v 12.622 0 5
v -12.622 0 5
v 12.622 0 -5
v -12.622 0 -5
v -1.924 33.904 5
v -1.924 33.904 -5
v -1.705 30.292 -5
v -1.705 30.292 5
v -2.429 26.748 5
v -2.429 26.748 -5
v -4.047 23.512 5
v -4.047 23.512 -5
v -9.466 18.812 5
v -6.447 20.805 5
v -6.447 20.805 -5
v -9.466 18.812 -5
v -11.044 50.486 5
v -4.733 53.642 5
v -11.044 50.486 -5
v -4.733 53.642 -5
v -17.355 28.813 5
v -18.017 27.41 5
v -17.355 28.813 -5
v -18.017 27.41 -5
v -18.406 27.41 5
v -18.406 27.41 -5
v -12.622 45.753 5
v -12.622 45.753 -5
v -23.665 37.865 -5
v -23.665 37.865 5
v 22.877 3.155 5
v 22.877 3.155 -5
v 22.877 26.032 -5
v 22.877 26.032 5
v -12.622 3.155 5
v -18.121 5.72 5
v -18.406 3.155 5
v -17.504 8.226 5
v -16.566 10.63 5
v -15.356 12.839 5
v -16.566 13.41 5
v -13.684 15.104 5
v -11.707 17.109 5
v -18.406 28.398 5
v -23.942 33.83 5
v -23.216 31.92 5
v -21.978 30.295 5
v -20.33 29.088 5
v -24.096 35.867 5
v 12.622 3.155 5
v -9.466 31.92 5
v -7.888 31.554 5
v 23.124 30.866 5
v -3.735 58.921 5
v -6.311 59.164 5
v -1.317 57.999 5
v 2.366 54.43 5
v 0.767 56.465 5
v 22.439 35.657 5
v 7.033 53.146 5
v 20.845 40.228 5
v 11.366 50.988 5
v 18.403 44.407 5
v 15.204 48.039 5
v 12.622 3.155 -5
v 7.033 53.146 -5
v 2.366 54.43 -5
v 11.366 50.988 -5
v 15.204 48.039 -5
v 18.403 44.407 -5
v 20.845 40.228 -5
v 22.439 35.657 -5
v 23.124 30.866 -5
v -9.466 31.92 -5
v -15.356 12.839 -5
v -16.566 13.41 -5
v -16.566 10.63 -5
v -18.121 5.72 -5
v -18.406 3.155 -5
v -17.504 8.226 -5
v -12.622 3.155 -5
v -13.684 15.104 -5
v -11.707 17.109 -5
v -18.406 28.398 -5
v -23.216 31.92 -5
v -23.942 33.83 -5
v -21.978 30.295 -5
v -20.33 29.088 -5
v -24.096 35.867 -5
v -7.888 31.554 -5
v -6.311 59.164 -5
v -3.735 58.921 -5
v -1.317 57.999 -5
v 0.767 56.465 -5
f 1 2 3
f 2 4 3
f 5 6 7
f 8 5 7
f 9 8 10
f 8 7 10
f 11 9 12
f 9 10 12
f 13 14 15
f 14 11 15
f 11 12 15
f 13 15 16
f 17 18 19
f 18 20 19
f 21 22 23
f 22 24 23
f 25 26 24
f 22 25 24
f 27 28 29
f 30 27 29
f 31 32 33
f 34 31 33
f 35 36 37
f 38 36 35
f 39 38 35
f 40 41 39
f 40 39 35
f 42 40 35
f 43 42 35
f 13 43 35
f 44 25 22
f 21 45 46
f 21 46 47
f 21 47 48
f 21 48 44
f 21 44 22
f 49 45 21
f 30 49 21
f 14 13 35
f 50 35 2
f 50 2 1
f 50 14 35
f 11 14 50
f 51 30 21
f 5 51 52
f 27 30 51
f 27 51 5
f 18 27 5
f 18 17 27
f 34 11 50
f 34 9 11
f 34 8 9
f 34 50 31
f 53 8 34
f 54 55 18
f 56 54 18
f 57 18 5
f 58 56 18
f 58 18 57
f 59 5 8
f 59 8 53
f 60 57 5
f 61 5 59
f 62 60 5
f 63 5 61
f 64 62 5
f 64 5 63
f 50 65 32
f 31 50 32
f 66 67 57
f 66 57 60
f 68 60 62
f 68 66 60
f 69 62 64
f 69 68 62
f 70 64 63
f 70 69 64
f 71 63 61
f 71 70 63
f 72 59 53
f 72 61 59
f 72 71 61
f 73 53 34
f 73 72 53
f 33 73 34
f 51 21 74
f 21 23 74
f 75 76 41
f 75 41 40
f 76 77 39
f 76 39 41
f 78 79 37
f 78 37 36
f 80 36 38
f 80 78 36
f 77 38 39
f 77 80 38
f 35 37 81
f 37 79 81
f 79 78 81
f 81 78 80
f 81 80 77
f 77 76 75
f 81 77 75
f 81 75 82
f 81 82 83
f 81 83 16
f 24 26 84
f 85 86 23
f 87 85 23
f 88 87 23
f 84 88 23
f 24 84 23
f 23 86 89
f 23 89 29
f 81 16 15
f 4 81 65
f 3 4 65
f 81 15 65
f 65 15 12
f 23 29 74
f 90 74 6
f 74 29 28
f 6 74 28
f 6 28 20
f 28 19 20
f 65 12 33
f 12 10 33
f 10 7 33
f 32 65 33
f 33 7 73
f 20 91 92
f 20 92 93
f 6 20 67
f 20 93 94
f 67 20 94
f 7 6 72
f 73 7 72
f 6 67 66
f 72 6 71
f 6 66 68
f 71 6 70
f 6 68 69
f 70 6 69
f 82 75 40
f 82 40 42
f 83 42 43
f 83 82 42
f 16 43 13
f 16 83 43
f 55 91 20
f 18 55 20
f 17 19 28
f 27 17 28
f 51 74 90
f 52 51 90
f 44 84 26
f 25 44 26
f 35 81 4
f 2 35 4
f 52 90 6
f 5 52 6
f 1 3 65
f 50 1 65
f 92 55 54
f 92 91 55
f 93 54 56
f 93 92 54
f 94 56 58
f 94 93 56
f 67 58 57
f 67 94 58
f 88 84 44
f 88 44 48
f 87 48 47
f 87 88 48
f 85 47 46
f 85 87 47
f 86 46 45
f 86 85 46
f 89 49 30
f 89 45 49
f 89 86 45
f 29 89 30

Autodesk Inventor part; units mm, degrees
ref_plane "YZ Plane" through (0, 0, 0) normal (1, 0, 0) x (0, 1, 0)
ref_plane "XZ Plane" through (0, 0, 0) normal (0, 1, 0) x (-1, 0, 0)
ref_plane "XY Plane" through (0, 0, 0) normal (0, 0, 1) x (1, 0, 0)
sketch "Boceto1" plane through (0, 0, 0) normal (0, 0, 1) x (1, 0, 0)
  line L0 (-55.5895, 69.239) -> (57.1029, 69.239) construction
  line L1 (57.1029, 69.239) -> (57.1029, -41.5752) construction
  line L2 (57.1029, -41.5752) -> (-55.5895, -41.5752) construction
  line L3 (-55.5895, -41.5752) -> (-55.5895, 69.239) construction
  line L4 (-12.6216, 0) -> (12.6216, 0)
  line L5 (12.6216, 0) -> (12.6216, 3.1554)
  line L6 (12.6216, 3.1554) -> (22.8766, 3.1554)
  line L7 (22.8766, 3.1554) -> (22.8766, 26.032)
  arc A0 (22.8766, 26.032) -> (2.3665, 54.4304) centre (-1.924, 29.7261) ccw
  arc A1 (2.3665, 54.4304) -> (-6.3108, 59.1635) centre (-5.9164, 49.5659) ccw
  line L8 (-6.3108, 59.1635) -> (-4.7331, 53.6416)
  line L9 (-4.7331, 53.6416) -> (-11.0439, 50.4862)
  line L10 (-11.0439, 50.4862) -> (-12.6216, 45.7531)
  line L11 (-12.6216, 45.7531) -> (-23.6654, 37.8647)
  arc A2 (-23.6654, 37.8647) -> (-18.4064, 28.3985) centre (-16.9879, 35.3805) ccw
  line L12 (-18.4064, 28.3985) -> (-9.4662, 31.9205)
  line L13 (-9.4662, 31.9205) -> (-7.8885, 31.5539)
  line L14 (-7.8885, 31.5539) -> (-1.924, 33.9035)
  arc A3 (-9.4662, 18.8123) -> (-1.924, 33.9035) centre (-15.5194, 31.2678) ccw
  arc A4 (-9.4662, 18.8123) -> (-18.4064, 3.1554) centre (1.3548, 2.2525) ccw
  line L15 (-18.4064, 3.1554) -> (-12.6216, 3.1554)
  line L16 (-12.6216, 3.1554) -> (-12.6216, 0)
  line L17 (-18.4064, 28.3985) -> (-18.4064, 27.4104)
  line L18 (-18.4064, 27.4104) -> (-18.0172, 27.4104)
  line L19 (-18.0172, 27.4104) -> (-17.3546, 28.8128)
  line L20 (-16.5658, 10.6295) -> (-16.5658, 13.4104)
  line L21 (-16.5658, 13.4104) -> (-15.356, 12.8389)
  point P0 (0, 0)
  point P1 (-18.2118, 27.4104)
  dimension "d8" = 14
extrude "Extrusión1" add sketch "Boceto1" along normal mid plane 10
properties part number "KIGTH TOP abrebotella medium 1.1"
